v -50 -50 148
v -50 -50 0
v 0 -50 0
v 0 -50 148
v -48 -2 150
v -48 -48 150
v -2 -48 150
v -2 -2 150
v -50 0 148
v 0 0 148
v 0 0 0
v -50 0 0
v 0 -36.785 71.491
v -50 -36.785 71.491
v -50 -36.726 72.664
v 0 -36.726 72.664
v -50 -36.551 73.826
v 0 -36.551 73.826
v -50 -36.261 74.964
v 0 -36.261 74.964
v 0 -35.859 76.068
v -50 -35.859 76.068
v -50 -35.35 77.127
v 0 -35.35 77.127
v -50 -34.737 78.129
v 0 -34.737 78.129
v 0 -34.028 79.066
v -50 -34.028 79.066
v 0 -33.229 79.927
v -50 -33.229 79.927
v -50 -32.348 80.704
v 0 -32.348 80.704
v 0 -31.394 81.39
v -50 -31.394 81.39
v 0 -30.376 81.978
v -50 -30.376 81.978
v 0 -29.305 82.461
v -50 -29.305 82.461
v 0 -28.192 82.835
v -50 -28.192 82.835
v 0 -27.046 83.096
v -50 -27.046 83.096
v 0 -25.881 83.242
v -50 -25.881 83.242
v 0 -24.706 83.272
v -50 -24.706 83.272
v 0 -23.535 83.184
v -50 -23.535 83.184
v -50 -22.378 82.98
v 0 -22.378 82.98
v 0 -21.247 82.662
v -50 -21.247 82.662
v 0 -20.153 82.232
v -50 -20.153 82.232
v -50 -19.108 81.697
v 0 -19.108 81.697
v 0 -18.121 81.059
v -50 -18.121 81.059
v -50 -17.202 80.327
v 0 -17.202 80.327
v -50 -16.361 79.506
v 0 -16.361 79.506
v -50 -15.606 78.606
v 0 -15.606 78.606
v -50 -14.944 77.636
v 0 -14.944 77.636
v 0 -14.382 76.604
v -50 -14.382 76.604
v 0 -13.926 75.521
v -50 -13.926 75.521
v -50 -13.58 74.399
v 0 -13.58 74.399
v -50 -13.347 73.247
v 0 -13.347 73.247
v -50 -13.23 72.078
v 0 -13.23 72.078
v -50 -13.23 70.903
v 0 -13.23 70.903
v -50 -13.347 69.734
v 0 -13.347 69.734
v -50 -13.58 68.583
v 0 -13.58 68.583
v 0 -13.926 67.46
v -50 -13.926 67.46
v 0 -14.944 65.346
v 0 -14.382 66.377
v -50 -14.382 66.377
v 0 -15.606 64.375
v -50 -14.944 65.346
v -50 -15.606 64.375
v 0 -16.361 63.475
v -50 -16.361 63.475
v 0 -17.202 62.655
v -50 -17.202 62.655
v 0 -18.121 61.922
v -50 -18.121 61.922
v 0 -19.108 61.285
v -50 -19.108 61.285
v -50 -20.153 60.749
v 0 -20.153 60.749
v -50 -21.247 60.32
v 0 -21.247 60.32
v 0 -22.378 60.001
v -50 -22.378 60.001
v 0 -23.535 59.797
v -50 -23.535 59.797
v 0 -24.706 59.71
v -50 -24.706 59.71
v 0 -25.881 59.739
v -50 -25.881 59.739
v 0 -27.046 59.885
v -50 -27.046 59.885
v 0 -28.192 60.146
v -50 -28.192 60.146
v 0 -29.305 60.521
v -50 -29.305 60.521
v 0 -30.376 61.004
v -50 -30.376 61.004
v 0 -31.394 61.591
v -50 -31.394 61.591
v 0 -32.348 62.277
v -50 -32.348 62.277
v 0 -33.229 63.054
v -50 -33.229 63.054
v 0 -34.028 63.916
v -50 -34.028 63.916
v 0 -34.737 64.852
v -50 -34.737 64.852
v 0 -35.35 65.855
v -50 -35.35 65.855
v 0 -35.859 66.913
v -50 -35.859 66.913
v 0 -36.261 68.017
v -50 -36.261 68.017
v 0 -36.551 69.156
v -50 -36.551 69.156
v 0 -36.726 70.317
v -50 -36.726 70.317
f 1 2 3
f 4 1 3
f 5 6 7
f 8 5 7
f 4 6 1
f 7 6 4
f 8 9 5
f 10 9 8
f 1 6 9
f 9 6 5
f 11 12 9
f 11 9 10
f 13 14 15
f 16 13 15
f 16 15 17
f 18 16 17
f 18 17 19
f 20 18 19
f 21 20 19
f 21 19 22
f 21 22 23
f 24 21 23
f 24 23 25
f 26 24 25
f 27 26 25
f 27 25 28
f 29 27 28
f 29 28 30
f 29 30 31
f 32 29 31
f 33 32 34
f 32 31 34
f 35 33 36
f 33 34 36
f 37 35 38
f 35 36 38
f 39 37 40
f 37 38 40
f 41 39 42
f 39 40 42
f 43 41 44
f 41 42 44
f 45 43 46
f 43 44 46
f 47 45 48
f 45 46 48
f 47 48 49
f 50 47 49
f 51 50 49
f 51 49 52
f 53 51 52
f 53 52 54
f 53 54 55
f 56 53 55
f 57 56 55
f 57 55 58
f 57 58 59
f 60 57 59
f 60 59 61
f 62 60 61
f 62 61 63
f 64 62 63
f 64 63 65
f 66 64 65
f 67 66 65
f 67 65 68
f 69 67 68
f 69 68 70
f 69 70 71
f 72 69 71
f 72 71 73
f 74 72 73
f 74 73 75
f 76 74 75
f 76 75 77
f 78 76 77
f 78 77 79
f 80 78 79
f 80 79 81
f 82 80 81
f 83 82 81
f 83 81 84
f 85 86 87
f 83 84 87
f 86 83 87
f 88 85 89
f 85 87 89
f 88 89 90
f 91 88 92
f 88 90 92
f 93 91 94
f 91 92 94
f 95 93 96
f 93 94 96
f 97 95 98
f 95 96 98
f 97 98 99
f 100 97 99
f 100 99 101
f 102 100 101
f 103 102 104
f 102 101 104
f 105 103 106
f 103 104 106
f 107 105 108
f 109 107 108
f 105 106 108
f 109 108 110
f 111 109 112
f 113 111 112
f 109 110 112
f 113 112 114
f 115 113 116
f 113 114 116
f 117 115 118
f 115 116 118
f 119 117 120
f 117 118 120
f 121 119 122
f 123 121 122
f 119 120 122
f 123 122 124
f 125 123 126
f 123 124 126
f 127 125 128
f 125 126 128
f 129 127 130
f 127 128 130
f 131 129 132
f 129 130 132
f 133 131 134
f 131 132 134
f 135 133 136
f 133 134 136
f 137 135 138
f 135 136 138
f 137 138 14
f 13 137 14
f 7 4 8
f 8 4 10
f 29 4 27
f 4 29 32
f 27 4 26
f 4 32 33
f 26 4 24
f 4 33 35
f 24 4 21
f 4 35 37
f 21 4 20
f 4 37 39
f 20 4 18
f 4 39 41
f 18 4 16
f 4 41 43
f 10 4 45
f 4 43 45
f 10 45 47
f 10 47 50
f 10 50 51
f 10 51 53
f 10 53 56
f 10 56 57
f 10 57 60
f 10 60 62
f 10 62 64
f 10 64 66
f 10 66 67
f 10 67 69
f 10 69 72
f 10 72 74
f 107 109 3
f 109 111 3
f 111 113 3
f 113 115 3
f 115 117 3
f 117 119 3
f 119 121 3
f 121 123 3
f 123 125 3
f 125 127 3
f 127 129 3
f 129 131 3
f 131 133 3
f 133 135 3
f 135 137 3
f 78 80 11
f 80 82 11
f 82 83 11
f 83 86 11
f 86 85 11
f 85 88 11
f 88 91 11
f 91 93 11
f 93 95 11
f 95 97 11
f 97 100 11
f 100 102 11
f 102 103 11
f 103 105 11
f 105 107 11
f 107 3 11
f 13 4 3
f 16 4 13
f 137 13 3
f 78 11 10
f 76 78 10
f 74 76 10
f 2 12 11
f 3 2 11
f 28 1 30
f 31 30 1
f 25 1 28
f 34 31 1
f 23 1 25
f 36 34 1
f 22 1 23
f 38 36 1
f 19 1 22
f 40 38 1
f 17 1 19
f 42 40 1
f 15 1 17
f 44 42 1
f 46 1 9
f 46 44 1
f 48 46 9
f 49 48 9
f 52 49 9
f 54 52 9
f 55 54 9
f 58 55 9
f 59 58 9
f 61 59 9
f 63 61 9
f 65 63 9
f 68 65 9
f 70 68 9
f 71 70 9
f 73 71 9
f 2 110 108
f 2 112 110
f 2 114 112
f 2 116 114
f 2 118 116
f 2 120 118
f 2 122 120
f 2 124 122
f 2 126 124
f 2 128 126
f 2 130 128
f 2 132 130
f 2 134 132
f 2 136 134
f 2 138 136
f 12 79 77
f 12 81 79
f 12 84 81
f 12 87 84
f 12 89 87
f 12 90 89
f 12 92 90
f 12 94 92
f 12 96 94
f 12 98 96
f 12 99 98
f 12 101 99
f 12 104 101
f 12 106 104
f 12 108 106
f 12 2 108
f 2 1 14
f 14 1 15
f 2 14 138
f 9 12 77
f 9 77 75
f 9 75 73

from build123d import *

# Parameters (mm, degrees)
F0_W     = 50
F0_H     = 50
F1_DEPTH = 150
F2_R     = 11.784689
F3_DEPTH = 131.62777
F4_SIZE  = 2


with BuildPart() as f1:
    # F0 (on Top) → F1 (new body)
    with BuildSketch(Plane.XY):
        with Locations((-25, -25)):
            Rectangle(F0_W, F0_H)
    extrude(amount=F1_DEPTH)

    # F2 (on face) → F3 (cut)
    with BuildSketch(Plane(origin=(-50, 0, 0), x_dir=(0, -1, 0), z_dir=(-1, 0, 0))):
        with Locations((25, 71.490675)):
            Circle(F2_R)
    extrude(amount=-F3_DEPTH, mode=Mode.SUBTRACT)

    # F4
    f4_edges = [f1.edges().sort_by_distance(p)[0] for p in [
        (-50, -25, 150),
        (0, -25, 150),
        (-25, -50, 150),
        (-25, 0, 150),
    ]]
    chamfer(f4_edges, length=F4_SIZE)


solid = f1.part
